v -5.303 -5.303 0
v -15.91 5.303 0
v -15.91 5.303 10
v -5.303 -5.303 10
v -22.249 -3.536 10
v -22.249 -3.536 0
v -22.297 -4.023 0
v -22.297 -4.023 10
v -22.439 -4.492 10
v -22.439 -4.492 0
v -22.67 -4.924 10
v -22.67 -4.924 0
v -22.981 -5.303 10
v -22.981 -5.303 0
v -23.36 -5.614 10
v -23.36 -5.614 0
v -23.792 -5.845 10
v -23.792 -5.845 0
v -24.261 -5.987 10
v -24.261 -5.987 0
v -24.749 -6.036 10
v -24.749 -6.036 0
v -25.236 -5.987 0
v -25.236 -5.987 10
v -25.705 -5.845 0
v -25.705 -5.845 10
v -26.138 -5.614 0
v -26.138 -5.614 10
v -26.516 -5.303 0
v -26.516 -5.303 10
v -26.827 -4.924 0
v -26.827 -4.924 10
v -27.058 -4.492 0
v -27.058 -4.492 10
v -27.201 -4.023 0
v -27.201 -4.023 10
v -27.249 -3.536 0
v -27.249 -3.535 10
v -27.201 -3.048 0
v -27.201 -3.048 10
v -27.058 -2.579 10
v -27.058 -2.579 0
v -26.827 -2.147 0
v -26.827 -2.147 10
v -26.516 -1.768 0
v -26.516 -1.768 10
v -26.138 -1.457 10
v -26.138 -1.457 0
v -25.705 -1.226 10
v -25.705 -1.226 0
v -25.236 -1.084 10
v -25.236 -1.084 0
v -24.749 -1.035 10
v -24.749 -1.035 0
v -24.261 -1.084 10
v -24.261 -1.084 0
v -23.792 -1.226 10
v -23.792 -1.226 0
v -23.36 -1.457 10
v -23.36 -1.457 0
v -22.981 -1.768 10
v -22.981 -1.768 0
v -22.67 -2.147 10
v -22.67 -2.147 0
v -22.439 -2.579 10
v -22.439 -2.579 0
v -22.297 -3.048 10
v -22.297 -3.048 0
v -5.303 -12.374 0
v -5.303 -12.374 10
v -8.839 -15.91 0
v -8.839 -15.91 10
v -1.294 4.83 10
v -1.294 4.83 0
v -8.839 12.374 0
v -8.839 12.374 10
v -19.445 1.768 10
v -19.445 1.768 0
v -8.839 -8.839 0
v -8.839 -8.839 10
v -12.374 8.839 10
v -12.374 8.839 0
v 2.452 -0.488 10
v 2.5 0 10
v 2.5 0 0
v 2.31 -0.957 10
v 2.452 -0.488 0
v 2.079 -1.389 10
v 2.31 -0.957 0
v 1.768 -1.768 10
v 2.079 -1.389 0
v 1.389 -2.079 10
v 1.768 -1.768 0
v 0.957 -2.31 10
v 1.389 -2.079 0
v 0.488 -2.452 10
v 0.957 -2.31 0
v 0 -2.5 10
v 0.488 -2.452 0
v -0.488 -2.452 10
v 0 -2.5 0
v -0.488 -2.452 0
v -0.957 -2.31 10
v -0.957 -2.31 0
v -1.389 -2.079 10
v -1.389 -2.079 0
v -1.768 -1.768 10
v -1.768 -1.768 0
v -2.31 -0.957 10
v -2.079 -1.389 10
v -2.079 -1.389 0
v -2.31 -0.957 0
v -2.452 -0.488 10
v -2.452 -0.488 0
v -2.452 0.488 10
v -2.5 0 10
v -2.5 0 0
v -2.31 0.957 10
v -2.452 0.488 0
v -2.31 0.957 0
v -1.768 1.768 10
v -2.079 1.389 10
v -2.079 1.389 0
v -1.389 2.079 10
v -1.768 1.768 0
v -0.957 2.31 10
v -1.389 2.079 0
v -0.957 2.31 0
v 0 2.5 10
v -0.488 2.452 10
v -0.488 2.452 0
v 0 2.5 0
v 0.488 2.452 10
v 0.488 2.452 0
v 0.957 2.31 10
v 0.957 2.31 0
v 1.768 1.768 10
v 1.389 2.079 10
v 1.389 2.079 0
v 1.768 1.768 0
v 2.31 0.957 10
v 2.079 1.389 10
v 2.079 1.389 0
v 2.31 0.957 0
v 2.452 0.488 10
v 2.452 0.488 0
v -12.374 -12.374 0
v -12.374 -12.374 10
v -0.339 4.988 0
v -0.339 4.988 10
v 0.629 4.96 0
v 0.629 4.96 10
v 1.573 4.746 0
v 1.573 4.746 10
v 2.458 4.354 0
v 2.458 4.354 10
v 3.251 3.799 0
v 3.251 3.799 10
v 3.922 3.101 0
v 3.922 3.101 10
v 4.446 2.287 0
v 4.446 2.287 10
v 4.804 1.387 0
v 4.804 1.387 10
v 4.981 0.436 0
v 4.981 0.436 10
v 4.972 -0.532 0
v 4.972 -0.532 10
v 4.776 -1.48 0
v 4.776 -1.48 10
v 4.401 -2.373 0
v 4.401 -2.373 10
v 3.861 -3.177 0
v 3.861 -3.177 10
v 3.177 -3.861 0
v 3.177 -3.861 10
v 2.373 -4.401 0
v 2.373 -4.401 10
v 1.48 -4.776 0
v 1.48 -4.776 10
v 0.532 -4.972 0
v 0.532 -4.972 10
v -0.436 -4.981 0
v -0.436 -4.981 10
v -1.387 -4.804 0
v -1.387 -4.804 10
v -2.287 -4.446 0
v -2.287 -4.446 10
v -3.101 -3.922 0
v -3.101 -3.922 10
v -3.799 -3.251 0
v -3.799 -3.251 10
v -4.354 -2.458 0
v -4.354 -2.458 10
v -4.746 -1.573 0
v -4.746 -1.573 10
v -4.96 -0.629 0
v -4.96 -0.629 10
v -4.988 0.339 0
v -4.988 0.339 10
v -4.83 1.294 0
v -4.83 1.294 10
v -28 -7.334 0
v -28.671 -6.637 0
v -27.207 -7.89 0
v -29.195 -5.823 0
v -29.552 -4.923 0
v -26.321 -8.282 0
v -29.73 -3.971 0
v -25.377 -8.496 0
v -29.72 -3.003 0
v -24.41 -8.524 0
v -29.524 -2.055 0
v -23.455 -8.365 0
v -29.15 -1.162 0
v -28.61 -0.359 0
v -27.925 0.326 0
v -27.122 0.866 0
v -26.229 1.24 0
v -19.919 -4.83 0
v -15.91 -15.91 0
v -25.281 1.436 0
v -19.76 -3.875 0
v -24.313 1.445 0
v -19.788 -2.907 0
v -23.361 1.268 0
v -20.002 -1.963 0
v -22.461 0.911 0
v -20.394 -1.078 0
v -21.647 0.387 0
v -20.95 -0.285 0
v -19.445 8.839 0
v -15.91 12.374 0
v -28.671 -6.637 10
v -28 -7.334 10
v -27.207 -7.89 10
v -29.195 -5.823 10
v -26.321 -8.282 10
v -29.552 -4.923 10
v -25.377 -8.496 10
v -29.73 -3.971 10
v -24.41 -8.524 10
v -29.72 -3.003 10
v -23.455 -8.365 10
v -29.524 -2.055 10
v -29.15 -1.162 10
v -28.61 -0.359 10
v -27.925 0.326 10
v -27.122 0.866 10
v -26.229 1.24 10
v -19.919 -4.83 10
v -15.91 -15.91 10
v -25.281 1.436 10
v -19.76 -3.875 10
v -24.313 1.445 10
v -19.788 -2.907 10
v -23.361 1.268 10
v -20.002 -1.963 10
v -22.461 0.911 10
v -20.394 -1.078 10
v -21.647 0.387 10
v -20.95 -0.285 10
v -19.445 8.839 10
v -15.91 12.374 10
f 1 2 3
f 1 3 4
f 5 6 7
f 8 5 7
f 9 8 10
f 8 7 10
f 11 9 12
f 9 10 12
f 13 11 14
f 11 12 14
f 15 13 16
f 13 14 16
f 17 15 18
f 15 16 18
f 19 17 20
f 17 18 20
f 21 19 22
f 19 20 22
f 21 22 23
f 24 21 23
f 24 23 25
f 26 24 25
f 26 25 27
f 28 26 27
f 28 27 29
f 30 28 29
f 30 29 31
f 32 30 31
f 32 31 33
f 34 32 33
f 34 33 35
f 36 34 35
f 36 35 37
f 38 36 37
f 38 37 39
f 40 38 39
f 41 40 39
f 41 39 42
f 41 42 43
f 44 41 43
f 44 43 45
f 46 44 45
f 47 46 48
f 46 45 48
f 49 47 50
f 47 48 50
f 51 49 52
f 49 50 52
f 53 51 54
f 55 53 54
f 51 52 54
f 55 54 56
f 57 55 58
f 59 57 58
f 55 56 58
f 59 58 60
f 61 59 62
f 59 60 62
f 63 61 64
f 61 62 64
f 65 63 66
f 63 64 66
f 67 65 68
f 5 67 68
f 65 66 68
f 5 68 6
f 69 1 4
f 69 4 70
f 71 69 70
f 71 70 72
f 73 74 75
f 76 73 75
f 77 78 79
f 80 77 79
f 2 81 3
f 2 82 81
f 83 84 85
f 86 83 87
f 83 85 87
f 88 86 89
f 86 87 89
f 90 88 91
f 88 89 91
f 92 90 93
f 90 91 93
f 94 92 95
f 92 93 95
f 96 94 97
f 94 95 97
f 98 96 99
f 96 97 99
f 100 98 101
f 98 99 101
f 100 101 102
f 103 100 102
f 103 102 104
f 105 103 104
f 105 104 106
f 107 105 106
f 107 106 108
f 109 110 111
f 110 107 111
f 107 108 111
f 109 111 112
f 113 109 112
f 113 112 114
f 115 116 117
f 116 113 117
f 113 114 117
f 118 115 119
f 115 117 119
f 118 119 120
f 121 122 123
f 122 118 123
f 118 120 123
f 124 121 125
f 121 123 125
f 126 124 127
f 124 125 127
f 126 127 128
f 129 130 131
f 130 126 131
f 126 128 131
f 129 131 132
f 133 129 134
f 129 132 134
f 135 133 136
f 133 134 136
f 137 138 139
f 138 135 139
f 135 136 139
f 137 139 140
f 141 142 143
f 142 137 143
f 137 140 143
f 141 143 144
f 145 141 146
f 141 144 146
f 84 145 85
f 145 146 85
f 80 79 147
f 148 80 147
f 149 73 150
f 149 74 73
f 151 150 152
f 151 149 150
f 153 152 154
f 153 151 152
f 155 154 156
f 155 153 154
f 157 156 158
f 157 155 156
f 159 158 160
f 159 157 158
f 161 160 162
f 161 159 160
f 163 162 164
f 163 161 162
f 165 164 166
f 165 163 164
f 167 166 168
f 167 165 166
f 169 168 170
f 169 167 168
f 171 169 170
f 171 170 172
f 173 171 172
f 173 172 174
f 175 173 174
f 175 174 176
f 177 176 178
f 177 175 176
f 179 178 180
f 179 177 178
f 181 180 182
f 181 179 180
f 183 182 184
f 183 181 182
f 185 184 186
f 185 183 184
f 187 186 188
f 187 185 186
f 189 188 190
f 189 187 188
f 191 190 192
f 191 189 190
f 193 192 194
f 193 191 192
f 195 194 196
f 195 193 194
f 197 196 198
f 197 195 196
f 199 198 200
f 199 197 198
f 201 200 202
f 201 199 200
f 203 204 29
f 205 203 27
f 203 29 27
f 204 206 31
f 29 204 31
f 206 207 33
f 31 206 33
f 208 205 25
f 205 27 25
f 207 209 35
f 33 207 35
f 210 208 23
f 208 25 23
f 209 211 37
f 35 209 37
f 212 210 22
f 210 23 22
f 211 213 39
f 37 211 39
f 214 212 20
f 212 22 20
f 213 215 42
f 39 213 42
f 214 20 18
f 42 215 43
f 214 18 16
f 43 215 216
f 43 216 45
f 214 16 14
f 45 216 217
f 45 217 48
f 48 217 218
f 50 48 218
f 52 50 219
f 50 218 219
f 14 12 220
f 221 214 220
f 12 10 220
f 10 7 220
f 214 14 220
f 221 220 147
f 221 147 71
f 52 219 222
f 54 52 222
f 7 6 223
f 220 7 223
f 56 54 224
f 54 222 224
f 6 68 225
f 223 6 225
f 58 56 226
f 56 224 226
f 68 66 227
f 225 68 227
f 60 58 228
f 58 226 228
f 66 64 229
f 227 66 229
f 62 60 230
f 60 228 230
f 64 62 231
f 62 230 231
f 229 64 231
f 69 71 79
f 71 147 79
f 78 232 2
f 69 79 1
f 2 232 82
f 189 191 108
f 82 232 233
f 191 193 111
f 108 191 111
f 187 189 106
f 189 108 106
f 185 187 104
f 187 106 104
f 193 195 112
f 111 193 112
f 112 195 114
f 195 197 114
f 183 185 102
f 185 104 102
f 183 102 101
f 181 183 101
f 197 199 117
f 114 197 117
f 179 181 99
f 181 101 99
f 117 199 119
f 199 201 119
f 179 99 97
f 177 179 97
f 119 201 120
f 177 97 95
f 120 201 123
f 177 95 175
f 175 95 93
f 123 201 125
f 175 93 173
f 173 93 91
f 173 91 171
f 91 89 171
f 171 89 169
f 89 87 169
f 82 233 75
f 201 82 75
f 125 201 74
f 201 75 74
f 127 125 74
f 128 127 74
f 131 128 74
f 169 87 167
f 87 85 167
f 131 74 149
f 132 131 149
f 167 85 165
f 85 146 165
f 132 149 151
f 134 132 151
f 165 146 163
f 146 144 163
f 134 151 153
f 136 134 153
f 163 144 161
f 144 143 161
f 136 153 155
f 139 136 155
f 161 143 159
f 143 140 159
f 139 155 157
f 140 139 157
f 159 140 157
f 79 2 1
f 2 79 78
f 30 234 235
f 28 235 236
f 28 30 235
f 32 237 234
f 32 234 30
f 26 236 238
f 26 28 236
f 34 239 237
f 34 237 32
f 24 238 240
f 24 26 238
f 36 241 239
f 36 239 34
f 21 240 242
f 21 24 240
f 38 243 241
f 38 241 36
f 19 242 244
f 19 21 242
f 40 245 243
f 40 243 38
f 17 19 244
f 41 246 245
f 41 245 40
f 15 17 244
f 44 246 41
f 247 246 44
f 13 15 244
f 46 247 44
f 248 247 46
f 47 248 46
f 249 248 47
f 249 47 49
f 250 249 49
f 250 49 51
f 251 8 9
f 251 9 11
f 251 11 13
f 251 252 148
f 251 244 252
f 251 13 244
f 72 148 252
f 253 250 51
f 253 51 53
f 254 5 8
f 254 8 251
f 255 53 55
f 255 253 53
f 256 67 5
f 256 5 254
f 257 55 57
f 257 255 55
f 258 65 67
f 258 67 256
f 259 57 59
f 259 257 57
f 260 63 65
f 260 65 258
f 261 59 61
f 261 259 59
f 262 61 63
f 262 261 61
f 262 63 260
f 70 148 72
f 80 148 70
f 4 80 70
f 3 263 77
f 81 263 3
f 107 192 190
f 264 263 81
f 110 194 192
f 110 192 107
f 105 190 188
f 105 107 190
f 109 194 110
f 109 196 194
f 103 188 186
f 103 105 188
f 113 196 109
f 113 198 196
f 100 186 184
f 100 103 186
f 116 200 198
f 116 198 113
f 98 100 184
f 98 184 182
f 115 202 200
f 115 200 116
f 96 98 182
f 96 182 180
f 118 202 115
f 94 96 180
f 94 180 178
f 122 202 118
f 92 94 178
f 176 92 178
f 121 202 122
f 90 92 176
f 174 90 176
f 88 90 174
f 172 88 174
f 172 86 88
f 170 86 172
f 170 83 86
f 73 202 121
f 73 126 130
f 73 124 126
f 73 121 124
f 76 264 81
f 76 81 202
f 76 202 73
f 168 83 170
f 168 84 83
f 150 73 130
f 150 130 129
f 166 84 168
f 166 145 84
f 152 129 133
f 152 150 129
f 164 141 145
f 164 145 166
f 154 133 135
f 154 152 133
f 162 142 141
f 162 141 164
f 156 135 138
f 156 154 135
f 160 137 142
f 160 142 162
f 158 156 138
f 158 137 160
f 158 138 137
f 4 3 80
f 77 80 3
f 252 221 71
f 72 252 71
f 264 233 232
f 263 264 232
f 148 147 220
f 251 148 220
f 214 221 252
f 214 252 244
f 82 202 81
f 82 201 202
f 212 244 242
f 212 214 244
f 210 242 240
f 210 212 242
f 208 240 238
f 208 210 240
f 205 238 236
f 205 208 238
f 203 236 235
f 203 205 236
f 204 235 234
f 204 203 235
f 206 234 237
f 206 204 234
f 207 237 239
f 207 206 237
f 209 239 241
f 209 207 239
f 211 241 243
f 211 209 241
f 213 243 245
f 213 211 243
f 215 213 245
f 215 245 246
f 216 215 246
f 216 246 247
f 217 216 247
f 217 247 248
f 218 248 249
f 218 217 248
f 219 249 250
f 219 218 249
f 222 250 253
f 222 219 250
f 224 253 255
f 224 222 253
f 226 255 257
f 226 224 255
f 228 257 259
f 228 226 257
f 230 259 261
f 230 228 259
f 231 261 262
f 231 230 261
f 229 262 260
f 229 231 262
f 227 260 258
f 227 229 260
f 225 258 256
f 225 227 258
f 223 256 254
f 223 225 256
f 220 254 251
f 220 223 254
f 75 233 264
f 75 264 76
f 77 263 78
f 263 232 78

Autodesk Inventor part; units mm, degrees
ref_plane "YZ Plane" through (0, 0, 0) normal (1, 0, 0) x (0, 1, 0)
ref_plane "XZ Plane" through (0, 0, 0) normal (0, 1, 0) x (-1, 0, 0)
ref_plane "XY Plane" through (0, 0, 0) normal (0, 0, 1) x (1, 0, 0)
sketch "Sketch1" plane through (0, 0, 0) normal (0, 0, 1) x (1, 0, 0)
  circle A0 centre (0, 0) radius 2.5
  circle A1 centre (0, 0) radius 5
  line L0 (-1.7678, -1.7678) -> (-12.3744, 8.8388)
  line L1 (-12.3744, 8.8388) -> (-15.9099, 5.3033)
  line L2 (-15.9099, 5.3033) -> (-5.3033, -5.3033)
  line L3 (-5.3033, -5.3033) -> (-5.3033, -12.3744)
  line L4 (-5.3033, -12.3744) -> (-8.8388, -15.9099)
  line L5 (-15.9099, -15.9099) -> (-26.5165, -5.3033)
  line L6 (1.7678, 1.7678) -> (-8.8388, 12.3744)
  line L7 (-15.9099, 12.3744) -> (-19.4454, 8.8388)
  line L8 (-19.4454, 8.8388) -> (-19.4454, 1.7678)
  line L9 (-19.4454, 1.7678) -> (-8.8388, -8.8388)
  line L10 (-8.8388, -8.8388) -> (-12.3744, -12.3744)
  line L11 (-12.3744, -12.3744) -> (-22.981, -1.7678)
  line L12 (-22.981, -1.7678) -> (-26.5165, -5.3033)
  line L13 (-1.7678, -1.7678) -> (1.7678, 1.7678)
  circle A2 centre (-24.7487, -3.5355) radius 2.5
  circle A3 centre (-24.7487, -3.5355) radius 5
  line L14 (-15.9099, 12.3744) -> (-8.8388, 12.3744)
  line L15 (-15.9099, -15.9099) -> (-8.8388, -15.9099)
  dimension "d0" = 5
  dimension "d1" = 10
  dimension "d3" = 90
  dimension "d6" = 135
  dimension "d7" = 135
  dimension "d8" = 90
  dimension "d9" = 5
  dimension "d12" = 10
  dimension "d13" = 15
  dimension "d14" = 15
  dimension "d31" = 7.0711
  dimension "d32" = 15
  dimension "d33" = 7.0711
  dimension "d34" = 15
  dimension "d35" = 7.0711
  dimension "d36" = 7.0711
  dimension "d37" = 5
  dimension "d38" = 90
  dimension "d39" = 135
  dimension "d40" = 5
  dimension "d41" = 5
extrude "Extrusion4" add sketch "Sketch1" along normal blind 10 contours A0 L6 A1 L0 | A0 L0 A1 L6 | A1 L0 L1 L2 L3 L4 L15 L5 A3 L11 L10 L9 L8 L7 L14 L6 | A3 L5 A2 L11 | L11 A2 L5 A3 | A2 L12 picked at (-25.0062, -4.328)
sketch "Sketch3" plane through (0, 0, 10) normal (0, 0, 1) x (1, 0, 0)
  line L0 (-1.2941, 4.8296) -> (-8.8388, 12.3744) projected
  line L1 (-8.8388, 12.3744) -> (-15.9099, 12.3744) projected
  line L2 (-15.9099, 12.3744) -> (-19.4454, 8.8388) projected
  line L3 (-19.4454, 8.8388) -> (-19.4454, 1.7678) projected
  line L4 (-19.4454, 1.7678) -> (-8.8388, -8.8388) projected
  line L5 (-8.8388, -8.8388) -> (-12.3744, -12.3744) projected
  line L6 (-12.3744, -12.3744) -> (-19.9191, -4.8296) projected
  arc A0 (-19.9191, -4.8296) -> (-23.4546, -8.3652) centre (-24.7487, -3.5355) ccw projected
  line L7 (-23.4546, -8.3652) -> (-15.9099, -15.9099) projected
  line L8 (-15.9099, -15.9099) -> (-8.8388, -15.9099) projected
  line L9 (-8.8388, -15.9099) -> (-5.3033, -12.3744) projected
  line L10 (-5.3033, -12.3744) -> (-5.3033, -5.3033) projected
  line L11 (-5.3033, -5.3033) -> (-15.9099, 5.3033) projected
  line L12 (-15.9099, 5.3033) -> (-12.3744, 8.8388) projected
  line L13 (-12.3744, 8.8388) -> (-4.8296, 1.2941) projected
  arc A1 (-4.8296, 1.2941) -> (-1.2941, 4.8296) centre (0, 0) ccw projected
  line L14 (-26.5165, -5.3033) -> (-22.981, -1.7678) projected
  arc A2 (-22.981, -1.7678) -> (-26.5165, -5.3033) centre (-24.7487, -3.5355) ccw projected
  circle A3 centre (0, 0) radius 2.5 projected
  circle A4 centre (-24.7487, -3.5355) radius 2.5
extrude "Extrusion5" cut sketch "Sketch3" against normal blind 10 contours L14 A4
equation "\"d1\" = 2 * d0"
equation "\"d9\" = d0"
equation "\"d12\" = d1"
equation "\"d13\" = 3 * d0"
equation "\"d14\" = d13"
properties part number "Sawaiz Logo Ribbon"
